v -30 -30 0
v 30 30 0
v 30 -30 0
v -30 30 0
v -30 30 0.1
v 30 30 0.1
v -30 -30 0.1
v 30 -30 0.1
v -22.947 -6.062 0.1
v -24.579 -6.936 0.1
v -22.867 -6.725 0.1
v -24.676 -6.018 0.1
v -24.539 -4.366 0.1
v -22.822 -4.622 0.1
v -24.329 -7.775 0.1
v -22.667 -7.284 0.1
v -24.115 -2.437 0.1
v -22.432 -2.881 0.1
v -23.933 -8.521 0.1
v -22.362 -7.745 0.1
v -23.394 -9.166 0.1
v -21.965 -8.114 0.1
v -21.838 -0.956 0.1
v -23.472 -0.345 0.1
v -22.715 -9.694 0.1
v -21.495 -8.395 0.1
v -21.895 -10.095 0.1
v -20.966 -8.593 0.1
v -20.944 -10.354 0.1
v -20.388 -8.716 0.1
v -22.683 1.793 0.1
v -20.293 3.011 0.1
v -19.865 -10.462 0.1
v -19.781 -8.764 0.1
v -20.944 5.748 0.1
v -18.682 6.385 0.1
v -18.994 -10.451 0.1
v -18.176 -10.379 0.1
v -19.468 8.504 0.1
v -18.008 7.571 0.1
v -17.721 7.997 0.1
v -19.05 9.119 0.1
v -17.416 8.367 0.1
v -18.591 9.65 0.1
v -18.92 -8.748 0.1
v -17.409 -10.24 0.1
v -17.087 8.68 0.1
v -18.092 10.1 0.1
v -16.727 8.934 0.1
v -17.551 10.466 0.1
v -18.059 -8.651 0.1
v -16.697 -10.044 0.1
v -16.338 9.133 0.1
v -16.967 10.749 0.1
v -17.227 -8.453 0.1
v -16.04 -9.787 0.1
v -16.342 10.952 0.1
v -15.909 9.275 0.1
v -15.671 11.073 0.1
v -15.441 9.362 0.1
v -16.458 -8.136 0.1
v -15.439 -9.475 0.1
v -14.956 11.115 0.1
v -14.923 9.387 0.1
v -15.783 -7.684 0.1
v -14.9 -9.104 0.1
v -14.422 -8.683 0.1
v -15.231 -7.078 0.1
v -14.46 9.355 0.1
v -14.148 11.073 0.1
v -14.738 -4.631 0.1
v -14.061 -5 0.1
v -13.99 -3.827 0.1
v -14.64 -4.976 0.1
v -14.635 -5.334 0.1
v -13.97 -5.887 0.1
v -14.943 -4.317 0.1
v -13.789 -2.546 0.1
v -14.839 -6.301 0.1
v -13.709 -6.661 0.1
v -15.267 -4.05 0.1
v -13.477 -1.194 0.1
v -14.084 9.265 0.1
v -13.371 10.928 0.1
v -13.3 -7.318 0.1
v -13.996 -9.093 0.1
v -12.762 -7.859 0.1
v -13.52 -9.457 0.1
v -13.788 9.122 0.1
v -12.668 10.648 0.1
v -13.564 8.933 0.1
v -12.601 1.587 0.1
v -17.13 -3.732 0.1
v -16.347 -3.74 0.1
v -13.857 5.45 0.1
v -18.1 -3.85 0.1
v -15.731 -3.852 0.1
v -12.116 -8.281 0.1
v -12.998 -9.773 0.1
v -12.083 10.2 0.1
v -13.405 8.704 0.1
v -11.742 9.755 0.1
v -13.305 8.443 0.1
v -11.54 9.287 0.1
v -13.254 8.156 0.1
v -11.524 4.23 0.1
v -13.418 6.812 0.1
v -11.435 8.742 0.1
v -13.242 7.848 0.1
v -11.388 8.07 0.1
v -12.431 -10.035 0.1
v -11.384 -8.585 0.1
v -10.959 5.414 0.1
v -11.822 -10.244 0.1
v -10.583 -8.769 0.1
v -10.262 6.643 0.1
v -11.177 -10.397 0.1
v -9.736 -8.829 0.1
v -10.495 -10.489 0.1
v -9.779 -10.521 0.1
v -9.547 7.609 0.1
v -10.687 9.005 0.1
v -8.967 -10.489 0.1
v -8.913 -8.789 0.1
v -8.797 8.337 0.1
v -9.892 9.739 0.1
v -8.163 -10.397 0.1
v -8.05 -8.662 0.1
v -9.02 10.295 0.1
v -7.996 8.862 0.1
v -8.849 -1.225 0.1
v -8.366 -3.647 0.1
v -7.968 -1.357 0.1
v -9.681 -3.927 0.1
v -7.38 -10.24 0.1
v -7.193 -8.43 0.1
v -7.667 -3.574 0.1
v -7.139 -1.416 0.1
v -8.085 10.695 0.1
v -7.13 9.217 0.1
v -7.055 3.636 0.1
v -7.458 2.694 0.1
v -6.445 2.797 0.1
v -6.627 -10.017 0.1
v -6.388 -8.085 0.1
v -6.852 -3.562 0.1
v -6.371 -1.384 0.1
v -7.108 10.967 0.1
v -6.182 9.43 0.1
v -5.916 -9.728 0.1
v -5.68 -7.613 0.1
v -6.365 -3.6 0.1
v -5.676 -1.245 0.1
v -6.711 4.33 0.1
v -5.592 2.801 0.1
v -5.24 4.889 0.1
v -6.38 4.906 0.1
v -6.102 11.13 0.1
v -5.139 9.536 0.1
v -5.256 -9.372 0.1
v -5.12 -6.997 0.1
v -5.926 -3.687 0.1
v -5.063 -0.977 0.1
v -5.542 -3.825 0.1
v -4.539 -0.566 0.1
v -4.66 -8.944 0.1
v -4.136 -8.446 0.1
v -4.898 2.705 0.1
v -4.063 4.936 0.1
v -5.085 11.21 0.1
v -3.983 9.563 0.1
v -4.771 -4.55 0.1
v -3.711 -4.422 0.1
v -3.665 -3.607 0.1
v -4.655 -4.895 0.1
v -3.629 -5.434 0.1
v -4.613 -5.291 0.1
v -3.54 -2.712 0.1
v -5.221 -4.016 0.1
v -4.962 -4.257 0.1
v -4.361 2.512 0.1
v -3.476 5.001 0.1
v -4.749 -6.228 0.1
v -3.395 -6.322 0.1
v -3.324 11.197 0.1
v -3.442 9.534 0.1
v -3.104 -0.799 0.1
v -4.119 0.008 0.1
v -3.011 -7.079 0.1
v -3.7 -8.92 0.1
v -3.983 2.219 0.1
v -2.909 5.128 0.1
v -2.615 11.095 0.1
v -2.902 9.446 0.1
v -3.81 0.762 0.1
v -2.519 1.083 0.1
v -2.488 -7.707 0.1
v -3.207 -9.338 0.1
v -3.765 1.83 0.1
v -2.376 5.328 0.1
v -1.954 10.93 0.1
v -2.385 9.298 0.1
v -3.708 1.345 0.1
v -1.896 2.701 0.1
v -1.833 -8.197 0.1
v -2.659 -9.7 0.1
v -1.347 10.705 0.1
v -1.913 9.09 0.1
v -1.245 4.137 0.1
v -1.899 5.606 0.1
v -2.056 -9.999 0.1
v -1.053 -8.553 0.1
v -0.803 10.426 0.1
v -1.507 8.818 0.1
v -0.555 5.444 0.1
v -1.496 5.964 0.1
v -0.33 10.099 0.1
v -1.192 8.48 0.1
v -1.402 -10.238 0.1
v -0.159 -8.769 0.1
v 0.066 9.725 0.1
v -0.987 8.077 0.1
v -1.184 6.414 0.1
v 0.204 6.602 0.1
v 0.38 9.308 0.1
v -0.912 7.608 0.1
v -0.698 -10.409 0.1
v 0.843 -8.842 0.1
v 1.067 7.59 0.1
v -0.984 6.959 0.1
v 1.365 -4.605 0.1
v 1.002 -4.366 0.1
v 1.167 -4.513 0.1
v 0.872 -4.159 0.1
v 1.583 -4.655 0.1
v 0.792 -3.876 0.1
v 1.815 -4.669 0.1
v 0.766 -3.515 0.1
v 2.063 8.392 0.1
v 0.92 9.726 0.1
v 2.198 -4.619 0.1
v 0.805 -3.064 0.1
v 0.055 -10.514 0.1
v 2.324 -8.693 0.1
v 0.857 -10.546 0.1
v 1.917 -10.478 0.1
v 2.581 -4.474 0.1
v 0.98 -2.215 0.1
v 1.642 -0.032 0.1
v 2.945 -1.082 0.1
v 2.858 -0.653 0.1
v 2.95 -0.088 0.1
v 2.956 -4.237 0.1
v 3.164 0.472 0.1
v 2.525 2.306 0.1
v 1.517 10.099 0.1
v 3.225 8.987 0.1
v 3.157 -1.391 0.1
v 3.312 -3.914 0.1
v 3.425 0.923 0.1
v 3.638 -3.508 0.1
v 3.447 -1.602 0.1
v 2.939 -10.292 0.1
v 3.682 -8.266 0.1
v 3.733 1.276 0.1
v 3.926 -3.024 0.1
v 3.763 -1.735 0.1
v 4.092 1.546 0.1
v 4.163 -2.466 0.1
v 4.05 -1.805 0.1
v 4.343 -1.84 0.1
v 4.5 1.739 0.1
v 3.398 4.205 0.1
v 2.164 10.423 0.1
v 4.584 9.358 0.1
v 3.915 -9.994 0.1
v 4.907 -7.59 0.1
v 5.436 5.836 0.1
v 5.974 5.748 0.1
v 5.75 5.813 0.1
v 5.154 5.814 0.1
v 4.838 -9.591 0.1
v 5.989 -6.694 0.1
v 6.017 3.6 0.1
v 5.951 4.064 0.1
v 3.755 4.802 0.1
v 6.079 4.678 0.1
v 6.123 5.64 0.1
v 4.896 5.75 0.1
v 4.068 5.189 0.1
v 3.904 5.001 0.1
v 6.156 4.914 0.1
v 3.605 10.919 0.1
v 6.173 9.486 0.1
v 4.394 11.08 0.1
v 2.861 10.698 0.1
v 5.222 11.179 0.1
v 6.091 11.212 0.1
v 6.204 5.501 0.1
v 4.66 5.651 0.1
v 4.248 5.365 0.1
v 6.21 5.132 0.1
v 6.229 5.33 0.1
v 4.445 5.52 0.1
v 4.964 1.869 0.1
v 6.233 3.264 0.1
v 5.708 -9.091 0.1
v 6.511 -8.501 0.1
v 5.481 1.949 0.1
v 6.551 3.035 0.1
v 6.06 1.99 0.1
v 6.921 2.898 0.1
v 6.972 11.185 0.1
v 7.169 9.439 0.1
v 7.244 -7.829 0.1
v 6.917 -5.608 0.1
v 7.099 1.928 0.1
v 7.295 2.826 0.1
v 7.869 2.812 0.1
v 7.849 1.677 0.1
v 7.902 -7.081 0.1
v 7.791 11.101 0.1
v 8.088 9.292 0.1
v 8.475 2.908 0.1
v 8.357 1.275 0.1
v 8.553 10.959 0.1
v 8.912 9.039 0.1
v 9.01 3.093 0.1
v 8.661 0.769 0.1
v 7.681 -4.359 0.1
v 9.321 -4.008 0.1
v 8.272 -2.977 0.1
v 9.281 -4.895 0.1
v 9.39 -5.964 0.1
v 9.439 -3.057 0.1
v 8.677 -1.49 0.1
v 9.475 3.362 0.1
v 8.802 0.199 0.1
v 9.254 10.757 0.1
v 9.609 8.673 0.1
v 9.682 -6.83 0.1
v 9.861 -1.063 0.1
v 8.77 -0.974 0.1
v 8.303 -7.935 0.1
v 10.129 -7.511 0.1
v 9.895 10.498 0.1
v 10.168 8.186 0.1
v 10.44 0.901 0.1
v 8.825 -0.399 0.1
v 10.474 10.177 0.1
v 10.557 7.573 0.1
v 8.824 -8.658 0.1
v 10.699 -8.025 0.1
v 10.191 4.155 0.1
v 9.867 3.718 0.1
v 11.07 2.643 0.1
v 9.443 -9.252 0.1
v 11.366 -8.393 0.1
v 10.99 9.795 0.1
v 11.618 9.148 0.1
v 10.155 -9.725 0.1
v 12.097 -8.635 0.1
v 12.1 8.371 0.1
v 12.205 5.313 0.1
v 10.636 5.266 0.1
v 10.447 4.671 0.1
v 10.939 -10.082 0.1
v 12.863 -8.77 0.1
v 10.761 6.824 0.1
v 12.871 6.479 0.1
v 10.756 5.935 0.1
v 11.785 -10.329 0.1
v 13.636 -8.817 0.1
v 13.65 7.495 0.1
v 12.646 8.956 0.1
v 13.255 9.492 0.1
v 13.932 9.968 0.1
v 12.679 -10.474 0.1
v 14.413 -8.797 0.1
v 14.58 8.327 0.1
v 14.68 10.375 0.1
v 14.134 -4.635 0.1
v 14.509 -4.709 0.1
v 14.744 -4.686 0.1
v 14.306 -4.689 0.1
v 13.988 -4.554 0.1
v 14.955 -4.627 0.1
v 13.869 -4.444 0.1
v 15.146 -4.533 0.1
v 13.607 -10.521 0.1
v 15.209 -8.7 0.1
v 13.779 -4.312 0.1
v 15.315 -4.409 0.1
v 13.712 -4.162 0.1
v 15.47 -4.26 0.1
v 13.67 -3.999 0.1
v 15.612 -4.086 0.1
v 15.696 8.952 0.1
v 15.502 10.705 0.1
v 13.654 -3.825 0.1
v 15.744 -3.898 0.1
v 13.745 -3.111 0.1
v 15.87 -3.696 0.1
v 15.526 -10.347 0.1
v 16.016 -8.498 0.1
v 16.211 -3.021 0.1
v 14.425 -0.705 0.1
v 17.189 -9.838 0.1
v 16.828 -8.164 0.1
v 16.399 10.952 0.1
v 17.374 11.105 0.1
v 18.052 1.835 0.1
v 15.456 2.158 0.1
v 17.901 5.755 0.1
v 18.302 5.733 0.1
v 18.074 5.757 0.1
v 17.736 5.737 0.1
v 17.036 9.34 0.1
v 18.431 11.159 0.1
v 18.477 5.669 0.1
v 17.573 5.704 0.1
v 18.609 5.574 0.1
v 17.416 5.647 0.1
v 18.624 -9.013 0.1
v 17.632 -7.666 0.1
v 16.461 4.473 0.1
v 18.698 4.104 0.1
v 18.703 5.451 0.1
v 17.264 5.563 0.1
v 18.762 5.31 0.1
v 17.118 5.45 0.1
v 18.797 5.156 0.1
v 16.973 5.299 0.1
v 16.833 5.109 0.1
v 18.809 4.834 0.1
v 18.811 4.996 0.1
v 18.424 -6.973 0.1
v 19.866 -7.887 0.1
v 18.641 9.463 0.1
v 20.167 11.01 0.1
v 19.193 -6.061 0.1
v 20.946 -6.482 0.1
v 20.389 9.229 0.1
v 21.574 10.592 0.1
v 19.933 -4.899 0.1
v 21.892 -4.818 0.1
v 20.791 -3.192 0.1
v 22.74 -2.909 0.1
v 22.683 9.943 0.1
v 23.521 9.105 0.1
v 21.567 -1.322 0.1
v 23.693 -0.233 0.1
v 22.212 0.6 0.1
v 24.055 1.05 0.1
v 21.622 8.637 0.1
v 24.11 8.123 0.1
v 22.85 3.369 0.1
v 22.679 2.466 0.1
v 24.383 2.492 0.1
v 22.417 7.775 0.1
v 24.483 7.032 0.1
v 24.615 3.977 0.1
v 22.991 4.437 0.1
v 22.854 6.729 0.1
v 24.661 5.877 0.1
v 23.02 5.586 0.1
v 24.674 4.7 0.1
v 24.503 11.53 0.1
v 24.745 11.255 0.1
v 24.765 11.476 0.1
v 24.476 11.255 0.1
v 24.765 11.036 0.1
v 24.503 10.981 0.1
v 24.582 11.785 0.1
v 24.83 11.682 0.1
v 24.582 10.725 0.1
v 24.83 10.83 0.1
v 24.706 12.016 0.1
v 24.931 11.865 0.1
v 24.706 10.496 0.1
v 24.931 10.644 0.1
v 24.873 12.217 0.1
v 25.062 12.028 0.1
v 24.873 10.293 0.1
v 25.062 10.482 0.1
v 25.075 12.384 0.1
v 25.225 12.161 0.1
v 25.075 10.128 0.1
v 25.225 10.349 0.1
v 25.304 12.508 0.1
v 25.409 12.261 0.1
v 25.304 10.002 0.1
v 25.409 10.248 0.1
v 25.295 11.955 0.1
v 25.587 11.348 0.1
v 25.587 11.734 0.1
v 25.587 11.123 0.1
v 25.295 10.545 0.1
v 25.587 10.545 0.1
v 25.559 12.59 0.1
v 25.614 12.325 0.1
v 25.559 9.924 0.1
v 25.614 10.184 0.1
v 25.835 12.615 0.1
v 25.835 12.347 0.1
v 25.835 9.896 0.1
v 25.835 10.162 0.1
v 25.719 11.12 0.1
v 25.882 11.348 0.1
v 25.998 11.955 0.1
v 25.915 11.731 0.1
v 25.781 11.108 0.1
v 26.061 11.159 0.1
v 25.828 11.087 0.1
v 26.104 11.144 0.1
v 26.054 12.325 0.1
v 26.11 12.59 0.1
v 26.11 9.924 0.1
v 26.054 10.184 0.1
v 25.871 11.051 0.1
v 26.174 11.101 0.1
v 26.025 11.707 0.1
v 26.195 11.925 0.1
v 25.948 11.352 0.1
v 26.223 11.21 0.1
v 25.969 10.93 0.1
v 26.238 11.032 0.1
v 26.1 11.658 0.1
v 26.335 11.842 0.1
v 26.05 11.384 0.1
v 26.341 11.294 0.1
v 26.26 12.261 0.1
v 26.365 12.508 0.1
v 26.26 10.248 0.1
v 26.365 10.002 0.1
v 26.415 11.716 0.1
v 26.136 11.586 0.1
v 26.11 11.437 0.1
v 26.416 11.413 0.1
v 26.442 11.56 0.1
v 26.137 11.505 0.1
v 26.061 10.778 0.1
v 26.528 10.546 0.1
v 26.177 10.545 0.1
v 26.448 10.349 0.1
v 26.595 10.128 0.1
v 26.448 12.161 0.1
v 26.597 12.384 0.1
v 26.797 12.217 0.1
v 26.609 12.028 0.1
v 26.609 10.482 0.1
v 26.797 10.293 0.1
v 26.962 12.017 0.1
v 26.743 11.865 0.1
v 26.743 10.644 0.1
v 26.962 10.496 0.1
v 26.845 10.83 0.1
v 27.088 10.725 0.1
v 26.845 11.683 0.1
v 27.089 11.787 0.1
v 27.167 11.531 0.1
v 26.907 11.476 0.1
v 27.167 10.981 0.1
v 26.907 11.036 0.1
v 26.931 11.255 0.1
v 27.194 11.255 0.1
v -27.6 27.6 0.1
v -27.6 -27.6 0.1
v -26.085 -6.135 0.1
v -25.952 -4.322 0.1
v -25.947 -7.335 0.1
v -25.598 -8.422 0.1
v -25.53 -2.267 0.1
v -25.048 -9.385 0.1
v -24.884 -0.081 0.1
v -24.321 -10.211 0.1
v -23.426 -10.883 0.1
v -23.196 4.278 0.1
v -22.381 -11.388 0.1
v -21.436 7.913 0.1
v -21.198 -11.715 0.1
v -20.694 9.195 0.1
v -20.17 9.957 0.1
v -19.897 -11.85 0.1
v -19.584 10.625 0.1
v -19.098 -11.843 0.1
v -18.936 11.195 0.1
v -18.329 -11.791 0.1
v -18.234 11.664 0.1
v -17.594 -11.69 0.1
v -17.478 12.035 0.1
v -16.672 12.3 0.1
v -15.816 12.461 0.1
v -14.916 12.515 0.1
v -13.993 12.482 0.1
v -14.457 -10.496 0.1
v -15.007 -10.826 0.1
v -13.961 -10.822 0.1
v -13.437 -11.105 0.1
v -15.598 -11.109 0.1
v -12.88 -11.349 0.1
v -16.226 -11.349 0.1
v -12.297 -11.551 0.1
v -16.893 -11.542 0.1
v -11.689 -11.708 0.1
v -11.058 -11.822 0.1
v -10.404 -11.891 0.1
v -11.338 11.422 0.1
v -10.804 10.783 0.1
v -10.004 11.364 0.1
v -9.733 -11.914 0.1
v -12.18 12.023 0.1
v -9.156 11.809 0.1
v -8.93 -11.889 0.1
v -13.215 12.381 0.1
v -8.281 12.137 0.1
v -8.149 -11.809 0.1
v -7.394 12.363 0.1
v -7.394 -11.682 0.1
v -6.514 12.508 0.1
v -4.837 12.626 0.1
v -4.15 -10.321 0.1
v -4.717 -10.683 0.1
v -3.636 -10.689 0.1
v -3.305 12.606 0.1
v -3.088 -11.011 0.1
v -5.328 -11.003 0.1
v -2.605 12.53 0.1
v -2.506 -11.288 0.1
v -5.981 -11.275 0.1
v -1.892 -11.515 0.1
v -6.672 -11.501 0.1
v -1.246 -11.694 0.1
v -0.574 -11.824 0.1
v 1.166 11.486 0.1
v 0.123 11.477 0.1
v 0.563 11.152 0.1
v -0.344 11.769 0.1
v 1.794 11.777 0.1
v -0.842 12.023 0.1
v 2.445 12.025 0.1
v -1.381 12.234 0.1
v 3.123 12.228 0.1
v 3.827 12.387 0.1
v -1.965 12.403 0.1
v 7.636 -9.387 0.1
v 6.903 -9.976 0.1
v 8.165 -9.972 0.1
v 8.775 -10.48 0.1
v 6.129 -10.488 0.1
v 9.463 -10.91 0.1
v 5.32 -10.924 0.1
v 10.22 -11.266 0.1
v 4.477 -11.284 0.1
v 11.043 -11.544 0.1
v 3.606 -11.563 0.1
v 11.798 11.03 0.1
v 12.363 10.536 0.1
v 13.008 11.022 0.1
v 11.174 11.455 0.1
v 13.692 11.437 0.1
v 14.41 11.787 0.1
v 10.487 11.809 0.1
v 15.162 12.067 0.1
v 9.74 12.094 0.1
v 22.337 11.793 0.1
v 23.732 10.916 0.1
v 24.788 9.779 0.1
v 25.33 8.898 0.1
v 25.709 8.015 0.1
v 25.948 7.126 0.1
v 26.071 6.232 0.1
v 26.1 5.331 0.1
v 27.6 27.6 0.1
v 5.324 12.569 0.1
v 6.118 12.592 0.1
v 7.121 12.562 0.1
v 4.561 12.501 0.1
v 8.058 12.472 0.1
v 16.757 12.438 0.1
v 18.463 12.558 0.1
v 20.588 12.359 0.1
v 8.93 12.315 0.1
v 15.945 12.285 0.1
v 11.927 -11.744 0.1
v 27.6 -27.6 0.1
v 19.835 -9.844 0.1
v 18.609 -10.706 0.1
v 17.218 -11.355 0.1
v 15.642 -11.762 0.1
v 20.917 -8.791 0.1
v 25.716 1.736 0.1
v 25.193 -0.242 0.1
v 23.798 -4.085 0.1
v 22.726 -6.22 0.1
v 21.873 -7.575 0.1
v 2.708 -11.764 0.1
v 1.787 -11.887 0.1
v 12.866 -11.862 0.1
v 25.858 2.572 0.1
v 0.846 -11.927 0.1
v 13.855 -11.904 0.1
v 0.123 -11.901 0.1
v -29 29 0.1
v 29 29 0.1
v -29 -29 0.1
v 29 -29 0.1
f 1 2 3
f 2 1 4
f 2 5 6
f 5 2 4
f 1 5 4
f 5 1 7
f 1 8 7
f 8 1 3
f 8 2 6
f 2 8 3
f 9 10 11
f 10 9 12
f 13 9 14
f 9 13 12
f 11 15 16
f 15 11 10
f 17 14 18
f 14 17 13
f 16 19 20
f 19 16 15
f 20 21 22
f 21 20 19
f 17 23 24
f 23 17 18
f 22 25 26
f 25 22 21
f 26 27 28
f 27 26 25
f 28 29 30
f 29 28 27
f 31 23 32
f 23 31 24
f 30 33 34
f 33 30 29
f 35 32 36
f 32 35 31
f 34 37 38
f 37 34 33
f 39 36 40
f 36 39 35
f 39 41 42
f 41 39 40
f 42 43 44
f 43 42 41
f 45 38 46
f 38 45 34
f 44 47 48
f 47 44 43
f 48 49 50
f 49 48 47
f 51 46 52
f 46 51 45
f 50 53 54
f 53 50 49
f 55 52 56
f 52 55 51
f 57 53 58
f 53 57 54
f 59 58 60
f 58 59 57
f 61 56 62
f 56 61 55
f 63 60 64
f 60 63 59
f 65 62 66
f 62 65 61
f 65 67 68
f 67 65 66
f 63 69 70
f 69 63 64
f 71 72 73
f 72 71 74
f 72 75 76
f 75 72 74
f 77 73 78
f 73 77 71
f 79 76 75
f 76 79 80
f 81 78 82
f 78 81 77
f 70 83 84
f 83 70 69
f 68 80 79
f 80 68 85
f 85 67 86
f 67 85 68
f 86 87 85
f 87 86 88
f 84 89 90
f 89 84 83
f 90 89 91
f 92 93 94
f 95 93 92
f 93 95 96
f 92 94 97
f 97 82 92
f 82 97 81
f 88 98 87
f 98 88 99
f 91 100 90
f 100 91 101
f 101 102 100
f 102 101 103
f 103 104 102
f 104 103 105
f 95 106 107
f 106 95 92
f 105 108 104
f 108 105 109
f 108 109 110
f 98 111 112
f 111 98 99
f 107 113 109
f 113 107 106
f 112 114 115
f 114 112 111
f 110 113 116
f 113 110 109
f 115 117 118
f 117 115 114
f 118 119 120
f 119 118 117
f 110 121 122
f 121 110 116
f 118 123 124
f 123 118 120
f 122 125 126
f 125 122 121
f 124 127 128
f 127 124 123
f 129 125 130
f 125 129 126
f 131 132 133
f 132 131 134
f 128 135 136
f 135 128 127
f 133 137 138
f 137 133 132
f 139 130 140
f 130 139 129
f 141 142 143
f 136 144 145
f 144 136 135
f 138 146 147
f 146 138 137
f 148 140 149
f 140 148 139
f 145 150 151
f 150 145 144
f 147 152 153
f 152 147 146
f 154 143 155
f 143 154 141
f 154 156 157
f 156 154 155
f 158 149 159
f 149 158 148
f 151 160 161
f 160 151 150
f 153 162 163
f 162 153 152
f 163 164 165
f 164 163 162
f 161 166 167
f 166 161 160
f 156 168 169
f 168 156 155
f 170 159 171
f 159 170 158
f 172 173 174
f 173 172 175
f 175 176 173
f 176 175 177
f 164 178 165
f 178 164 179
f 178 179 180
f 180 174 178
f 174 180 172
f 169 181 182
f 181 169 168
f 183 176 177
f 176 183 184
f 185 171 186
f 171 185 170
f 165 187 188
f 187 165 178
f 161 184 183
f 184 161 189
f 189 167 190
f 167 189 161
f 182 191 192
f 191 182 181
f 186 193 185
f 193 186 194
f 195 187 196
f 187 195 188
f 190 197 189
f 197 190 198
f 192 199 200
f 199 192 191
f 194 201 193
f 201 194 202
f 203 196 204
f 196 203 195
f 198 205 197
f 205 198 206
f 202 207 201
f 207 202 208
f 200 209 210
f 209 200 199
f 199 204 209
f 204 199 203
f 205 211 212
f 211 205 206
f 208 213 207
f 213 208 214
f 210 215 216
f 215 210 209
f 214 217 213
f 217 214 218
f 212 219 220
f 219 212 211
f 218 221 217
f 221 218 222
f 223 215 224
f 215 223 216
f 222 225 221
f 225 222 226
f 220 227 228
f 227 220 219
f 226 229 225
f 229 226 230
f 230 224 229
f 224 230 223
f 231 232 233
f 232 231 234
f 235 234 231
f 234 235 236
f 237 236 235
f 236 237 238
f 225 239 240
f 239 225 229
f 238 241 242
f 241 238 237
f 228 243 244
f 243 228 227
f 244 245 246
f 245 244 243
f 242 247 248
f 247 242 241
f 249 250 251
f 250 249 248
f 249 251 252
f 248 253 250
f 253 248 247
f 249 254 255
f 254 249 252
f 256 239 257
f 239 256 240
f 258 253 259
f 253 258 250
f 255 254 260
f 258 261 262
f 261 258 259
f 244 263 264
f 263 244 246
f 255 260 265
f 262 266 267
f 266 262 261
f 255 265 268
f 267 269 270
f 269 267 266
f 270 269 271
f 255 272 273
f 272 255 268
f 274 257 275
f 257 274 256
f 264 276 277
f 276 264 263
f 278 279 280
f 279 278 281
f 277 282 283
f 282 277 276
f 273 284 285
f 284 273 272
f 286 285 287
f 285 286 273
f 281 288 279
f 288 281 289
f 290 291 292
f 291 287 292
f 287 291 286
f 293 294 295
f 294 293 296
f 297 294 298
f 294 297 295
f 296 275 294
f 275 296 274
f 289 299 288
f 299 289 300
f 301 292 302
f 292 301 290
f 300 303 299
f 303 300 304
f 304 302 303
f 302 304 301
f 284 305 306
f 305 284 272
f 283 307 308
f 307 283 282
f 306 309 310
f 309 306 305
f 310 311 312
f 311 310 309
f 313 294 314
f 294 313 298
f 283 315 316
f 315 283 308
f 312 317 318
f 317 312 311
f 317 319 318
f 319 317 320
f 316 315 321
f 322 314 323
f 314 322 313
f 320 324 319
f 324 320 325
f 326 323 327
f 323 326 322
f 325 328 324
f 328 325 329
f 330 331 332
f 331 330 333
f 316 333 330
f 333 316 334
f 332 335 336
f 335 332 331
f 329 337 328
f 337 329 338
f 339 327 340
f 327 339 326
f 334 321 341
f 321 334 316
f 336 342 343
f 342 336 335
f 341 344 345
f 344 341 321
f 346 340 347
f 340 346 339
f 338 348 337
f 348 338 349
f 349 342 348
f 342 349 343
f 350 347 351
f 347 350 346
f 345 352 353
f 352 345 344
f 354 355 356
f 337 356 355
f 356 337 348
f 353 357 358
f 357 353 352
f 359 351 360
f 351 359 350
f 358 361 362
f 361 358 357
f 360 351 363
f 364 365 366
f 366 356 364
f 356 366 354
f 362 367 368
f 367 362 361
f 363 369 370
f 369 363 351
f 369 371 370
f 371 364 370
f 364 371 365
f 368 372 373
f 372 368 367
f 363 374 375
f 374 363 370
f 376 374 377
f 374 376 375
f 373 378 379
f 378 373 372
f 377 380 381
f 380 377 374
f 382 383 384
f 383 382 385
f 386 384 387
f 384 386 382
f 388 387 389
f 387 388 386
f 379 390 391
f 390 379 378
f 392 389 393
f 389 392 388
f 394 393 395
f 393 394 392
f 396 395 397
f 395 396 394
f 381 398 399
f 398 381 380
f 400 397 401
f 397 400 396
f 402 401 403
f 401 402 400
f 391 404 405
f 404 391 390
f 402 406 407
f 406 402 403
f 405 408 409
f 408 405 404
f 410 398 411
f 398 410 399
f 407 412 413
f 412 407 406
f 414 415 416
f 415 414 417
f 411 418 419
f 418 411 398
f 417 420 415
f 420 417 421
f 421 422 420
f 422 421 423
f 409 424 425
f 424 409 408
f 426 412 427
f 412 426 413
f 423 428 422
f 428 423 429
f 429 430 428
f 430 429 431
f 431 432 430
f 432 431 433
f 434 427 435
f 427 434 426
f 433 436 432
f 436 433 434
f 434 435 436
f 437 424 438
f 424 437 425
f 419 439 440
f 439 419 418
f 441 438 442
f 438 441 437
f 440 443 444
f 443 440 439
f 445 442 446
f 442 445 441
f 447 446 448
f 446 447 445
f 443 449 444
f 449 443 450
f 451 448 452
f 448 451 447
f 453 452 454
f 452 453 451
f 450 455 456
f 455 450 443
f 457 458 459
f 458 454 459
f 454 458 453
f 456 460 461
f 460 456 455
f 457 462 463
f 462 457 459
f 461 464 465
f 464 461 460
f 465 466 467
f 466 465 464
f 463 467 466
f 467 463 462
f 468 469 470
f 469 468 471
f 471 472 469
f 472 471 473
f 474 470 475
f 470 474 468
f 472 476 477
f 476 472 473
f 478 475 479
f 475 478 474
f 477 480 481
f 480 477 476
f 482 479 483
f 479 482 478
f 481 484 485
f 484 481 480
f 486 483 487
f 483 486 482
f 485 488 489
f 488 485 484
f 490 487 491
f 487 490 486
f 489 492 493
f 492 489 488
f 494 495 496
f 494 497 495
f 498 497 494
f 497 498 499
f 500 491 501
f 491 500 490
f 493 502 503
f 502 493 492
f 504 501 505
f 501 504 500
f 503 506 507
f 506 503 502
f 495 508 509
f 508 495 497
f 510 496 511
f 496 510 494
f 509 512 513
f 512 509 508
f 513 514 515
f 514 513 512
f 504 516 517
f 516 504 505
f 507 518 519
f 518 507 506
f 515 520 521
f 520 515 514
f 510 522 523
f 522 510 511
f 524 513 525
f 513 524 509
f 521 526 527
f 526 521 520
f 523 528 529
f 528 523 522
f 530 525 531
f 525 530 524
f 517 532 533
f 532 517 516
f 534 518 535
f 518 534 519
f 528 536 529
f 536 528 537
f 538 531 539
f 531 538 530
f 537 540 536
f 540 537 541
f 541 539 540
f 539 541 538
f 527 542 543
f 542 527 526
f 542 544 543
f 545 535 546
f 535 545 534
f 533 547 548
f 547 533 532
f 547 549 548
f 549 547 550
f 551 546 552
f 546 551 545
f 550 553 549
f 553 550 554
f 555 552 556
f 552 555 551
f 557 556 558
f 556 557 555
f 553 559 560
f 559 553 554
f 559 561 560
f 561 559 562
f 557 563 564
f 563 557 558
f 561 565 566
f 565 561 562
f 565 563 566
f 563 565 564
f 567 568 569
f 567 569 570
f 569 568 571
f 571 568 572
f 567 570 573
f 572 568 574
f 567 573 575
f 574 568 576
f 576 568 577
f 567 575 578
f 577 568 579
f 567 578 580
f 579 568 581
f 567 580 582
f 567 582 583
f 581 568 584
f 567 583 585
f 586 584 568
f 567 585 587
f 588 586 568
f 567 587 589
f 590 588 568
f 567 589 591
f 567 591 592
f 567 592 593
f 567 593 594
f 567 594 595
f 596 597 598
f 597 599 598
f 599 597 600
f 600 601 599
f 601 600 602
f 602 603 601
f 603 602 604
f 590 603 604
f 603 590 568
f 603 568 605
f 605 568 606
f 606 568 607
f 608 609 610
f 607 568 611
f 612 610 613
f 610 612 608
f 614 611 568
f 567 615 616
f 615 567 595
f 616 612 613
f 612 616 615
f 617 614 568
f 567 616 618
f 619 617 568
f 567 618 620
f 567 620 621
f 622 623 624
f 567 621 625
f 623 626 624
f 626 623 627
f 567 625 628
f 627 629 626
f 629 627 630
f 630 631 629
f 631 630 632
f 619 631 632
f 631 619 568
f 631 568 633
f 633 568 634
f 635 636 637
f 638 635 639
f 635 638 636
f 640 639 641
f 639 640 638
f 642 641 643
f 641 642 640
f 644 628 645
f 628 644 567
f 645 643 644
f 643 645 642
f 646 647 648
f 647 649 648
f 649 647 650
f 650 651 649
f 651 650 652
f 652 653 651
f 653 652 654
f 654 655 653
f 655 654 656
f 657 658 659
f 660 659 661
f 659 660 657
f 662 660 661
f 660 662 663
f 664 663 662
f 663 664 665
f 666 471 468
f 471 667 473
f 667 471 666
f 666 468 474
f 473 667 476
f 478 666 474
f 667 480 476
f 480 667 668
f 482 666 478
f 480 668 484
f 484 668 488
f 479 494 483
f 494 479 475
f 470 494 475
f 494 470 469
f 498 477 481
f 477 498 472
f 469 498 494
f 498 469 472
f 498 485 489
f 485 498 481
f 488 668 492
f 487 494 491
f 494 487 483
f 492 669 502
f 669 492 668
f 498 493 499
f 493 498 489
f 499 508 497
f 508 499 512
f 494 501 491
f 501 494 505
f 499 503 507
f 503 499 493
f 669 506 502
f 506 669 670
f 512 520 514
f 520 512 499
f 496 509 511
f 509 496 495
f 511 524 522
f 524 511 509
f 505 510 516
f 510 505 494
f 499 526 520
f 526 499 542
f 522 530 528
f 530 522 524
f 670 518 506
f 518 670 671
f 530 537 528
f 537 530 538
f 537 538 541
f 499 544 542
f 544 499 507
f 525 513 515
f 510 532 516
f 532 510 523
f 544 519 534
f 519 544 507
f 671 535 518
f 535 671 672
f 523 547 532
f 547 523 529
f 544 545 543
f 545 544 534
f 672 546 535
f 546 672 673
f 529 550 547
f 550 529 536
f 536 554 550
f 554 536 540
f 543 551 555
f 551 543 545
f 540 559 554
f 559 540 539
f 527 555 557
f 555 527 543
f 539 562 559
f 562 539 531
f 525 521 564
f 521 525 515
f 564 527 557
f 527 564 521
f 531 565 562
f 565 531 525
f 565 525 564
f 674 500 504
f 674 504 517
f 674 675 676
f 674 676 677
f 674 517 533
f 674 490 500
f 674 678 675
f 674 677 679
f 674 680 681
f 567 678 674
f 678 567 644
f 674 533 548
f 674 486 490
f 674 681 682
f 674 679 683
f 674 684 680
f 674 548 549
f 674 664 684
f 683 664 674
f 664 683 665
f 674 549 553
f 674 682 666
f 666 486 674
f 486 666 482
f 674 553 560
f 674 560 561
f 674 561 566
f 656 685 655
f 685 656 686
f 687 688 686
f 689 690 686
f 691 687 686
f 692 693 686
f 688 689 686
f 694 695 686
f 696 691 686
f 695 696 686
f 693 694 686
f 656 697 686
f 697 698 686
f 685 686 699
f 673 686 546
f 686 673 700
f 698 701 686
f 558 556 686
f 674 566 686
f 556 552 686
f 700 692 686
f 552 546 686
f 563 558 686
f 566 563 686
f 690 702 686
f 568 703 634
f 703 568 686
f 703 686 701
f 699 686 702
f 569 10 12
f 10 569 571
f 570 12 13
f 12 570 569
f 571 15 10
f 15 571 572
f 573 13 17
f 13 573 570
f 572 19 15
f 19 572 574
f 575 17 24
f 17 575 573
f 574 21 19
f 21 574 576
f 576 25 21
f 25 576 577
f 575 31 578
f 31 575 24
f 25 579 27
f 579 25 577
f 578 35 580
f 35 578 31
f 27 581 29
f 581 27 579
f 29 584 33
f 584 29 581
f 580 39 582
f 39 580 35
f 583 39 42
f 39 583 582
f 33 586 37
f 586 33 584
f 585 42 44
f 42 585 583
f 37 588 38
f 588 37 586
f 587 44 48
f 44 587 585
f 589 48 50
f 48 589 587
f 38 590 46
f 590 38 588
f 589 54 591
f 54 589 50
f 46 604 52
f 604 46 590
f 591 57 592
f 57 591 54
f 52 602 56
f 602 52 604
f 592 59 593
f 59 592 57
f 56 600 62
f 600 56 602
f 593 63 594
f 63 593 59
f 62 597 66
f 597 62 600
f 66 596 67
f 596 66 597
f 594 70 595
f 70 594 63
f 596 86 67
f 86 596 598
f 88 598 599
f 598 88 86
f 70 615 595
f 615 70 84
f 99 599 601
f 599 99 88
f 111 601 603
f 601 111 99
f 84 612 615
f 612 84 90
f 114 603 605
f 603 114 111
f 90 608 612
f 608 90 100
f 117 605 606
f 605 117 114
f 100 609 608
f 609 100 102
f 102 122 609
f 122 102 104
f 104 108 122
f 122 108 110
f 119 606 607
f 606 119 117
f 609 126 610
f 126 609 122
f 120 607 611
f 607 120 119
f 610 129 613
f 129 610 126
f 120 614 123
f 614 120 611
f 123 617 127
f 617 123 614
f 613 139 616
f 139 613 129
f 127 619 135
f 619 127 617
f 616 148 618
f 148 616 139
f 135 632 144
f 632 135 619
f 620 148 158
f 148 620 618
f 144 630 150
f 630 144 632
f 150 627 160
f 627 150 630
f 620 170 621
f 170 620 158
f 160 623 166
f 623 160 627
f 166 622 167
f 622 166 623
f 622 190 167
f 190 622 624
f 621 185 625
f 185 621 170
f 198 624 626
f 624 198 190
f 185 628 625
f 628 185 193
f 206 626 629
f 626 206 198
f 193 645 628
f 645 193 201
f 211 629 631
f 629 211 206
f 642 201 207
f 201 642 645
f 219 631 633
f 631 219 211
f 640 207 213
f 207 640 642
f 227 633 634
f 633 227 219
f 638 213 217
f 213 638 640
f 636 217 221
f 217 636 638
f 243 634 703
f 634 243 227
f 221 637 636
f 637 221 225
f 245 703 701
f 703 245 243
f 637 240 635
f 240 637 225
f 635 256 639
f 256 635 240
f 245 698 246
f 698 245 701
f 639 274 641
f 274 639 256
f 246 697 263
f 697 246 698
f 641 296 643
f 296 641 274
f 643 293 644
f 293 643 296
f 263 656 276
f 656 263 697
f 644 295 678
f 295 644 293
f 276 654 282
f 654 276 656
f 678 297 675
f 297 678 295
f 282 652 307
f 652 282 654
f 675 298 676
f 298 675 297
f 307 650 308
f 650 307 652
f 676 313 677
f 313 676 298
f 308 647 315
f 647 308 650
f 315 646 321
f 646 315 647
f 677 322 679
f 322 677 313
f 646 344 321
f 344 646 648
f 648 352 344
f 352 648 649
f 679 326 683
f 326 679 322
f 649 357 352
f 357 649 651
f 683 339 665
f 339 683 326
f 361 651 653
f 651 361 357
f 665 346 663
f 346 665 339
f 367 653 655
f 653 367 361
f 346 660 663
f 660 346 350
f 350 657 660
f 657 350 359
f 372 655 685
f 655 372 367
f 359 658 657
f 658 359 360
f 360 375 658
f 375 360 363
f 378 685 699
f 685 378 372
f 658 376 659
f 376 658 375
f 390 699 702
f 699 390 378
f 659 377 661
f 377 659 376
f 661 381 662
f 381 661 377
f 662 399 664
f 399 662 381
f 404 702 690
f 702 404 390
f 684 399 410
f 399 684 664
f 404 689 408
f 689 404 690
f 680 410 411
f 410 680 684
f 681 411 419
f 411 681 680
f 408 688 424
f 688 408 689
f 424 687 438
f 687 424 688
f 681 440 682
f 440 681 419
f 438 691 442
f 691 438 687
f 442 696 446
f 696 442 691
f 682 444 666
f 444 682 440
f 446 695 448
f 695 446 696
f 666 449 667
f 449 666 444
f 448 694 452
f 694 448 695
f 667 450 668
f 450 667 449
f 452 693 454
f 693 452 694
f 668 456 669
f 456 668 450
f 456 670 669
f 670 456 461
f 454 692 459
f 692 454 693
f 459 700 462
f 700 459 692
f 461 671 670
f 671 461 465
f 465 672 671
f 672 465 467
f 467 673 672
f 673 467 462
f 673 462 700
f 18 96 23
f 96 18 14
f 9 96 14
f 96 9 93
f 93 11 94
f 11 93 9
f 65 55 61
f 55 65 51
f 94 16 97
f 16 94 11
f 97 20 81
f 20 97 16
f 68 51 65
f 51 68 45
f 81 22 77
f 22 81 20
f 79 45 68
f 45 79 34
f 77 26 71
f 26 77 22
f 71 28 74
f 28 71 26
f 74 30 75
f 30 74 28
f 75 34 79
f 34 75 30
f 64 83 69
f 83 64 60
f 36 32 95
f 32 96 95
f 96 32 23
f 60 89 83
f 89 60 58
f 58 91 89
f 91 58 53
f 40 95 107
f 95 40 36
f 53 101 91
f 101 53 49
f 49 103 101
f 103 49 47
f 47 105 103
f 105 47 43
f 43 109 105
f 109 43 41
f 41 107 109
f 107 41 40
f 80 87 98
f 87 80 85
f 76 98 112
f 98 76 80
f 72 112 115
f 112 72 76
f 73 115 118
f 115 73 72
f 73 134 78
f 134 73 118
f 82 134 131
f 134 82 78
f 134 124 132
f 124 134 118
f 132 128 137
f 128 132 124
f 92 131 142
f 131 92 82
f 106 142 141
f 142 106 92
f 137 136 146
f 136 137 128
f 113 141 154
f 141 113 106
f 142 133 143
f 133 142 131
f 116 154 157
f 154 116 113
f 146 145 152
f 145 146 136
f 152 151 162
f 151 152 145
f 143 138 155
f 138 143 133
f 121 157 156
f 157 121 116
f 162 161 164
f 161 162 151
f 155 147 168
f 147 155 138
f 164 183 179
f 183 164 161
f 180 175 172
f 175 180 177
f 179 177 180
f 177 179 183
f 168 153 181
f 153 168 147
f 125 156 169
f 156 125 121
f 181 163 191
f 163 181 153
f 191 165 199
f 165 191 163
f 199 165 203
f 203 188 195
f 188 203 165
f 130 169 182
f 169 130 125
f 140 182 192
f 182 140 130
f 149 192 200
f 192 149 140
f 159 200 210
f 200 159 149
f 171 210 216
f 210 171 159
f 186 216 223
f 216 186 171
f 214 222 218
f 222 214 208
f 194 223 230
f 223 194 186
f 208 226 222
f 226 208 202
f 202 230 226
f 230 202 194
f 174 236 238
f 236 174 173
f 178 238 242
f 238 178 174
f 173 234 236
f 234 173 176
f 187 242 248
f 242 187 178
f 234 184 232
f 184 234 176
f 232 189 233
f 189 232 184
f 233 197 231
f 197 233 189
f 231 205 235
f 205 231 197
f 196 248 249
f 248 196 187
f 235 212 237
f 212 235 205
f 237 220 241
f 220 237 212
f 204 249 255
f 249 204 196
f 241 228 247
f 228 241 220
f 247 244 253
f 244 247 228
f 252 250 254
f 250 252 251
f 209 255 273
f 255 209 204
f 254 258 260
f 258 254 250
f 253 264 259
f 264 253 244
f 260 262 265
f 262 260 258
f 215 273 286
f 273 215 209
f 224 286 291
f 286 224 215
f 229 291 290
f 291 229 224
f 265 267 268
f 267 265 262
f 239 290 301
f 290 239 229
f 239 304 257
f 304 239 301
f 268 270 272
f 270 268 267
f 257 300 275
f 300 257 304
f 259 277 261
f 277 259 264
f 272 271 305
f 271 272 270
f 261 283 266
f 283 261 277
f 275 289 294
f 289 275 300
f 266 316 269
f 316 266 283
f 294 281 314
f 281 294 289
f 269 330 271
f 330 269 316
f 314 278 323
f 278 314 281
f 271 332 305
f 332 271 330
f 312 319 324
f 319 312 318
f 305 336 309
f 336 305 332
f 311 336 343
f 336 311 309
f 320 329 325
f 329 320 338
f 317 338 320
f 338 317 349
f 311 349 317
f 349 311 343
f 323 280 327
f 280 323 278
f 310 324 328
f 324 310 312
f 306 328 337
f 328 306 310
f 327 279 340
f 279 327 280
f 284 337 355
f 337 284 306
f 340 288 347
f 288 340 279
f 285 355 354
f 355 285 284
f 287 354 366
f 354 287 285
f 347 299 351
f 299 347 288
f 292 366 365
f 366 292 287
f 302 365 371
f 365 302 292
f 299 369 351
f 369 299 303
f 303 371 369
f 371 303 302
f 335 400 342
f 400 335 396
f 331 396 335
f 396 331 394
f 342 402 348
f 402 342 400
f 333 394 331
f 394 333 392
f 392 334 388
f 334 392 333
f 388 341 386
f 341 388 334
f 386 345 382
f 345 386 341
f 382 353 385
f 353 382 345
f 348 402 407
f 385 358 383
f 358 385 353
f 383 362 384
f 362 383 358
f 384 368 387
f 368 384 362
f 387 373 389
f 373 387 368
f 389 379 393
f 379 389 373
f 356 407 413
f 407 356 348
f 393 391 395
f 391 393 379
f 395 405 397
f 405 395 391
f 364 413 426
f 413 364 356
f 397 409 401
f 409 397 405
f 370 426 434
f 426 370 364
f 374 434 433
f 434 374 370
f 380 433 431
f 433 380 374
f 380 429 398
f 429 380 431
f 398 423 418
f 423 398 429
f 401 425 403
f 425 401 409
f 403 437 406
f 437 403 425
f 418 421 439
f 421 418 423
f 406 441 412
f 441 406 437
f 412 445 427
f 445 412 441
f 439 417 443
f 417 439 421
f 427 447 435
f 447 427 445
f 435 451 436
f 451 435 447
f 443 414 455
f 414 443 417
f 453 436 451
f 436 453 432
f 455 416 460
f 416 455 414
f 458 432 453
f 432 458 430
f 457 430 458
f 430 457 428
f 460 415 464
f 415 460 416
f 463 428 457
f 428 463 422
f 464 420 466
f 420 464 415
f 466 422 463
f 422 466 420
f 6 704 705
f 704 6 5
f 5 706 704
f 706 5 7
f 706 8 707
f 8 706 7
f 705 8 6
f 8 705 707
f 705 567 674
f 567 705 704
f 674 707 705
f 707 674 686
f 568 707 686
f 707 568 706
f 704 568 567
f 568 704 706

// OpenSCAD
use <../lib.scad>
use <../p/box5-12.scad>
use <../p/logo-lego-2.scad>
function ldraw_lib__4155159a() = [
// 0 Sticker  7.5 x  7.5 with LEGO Logo
// 0 Name: 4155159a.dat
// 0 Author: Marc Giraudet [Mad_Marc]
// 0 !LDRAW_ORG Part UPDATE 2024-03
// 0 !LICENSE Licensed under CC BY 4.0 : see CAreadme.txt
// 
// 0 BFC CERTIFY CCW
  [0,"BFC","CERTIFY"],
  [0,"BFC","CCW"],
// 
// 0 !KEYWORDS Bricklink 3723stk01, Brickowl 227757, Rebrickable 41096, Set 3723
// 
// 0 !HISTORY 2024-04-28 [OrionP] Official Update 2024-03
// 
// 
// 1 16 0 -0.25 0 75 0 0 0 0.25 0 0 0 75 box5-12.dat
  [1,16,0,-0.25,0,75,0,0,0,0.25,0,0,0,75, ldraw_lib__box5_12()],
// 1 16 0 -0.25 0 3.45 0 0 0 0 1 0 -3.45 0 logo-lego-2.dat
  [1,16,0,-0.25,0,3.45,0,0,0,0,1,0,-3.45,0, ldraw_lib__logo_lego_2()],
// 4 0 75 -0.25 75 -75 -0.25 75 -72.5 -0.25 72.5 72.5 -0.25 72.5
  [4,0,75,-0.25,75,-75,-0.25,75,-72.5,-0.25,72.5,72.5,-0.25,72.5],
// 4 0 -75 -0.25 75 -75 -0.25 -75 -72.5 -0.25 -72.5 -72.5 -0.25 72.5
  [4,0,-75,-0.25,75,-75,-0.25,-75,-72.5,-0.25,-72.5,-72.5,-0.25,72.5],
// 4 0 -75 -0.25 -75 75 -0.25 -75 72.5 -0.25 -72.5 -72.5 -0.25 -72.5
  [4,0,-75,-0.25,-75,75,-0.25,-75,72.5,-0.25,-72.5,-72.5,-0.25,-72.5],
// 4 0 75 -0.25 -75 75 -0.25 75 72.5 -0.25 72.5 72.5 -0.25 -72.5
  [4,0,75,-0.25,-75,75,-0.25,75,72.5,-0.25,72.5,72.5,-0.25,-72.5],
// 4 4 -72.5 -0.25 72.5 -69 -0.25 69 69 -0.25 69 72.5 -0.25 72.5
  [4,4,-72.5,-0.25,72.5,-69,-0.25,69,69,-0.25,69,72.5,-0.25,72.5],
// 4 4 72.5 -0.25 72.5 69 -0.25 69 69 -0.25 -69 72.5 -0.25 -72.5
  [4,4,72.5,-0.25,72.5,69,-0.25,69,69,-0.25,-69,72.5,-0.25,-72.5],
// 4 4 -72.5 -0.25 -72.5 72.5 -0.25 -72.5 69 -0.25 -69 -69 -0.25 -69
  [4,4,-72.5,-0.25,-72.5,72.5,-0.25,-72.5,69,-0.25,-69,-69,-0.25,-69],
// 4 4 -72.5 -0.25 72.5 -72.5 -0.25 -72.5 -69 -0.25 -69 -69 -0.25 69
  [4,4,-72.5,-0.25,72.5,-72.5,-0.25,-72.5,-69,-0.25,-69,-69,-0.25,69],
];
module ldraw_lib__4155159a(step=0, col=false, unit=2/5, alt=false, line=0.2, solid=!$preview)
    makepoly(ldraw_lib__4155159a(), step=step, col=col, unit=unit, alt=alt, line=line, solid=solid);
ldraw_lib__4155159a(line=0.2);
